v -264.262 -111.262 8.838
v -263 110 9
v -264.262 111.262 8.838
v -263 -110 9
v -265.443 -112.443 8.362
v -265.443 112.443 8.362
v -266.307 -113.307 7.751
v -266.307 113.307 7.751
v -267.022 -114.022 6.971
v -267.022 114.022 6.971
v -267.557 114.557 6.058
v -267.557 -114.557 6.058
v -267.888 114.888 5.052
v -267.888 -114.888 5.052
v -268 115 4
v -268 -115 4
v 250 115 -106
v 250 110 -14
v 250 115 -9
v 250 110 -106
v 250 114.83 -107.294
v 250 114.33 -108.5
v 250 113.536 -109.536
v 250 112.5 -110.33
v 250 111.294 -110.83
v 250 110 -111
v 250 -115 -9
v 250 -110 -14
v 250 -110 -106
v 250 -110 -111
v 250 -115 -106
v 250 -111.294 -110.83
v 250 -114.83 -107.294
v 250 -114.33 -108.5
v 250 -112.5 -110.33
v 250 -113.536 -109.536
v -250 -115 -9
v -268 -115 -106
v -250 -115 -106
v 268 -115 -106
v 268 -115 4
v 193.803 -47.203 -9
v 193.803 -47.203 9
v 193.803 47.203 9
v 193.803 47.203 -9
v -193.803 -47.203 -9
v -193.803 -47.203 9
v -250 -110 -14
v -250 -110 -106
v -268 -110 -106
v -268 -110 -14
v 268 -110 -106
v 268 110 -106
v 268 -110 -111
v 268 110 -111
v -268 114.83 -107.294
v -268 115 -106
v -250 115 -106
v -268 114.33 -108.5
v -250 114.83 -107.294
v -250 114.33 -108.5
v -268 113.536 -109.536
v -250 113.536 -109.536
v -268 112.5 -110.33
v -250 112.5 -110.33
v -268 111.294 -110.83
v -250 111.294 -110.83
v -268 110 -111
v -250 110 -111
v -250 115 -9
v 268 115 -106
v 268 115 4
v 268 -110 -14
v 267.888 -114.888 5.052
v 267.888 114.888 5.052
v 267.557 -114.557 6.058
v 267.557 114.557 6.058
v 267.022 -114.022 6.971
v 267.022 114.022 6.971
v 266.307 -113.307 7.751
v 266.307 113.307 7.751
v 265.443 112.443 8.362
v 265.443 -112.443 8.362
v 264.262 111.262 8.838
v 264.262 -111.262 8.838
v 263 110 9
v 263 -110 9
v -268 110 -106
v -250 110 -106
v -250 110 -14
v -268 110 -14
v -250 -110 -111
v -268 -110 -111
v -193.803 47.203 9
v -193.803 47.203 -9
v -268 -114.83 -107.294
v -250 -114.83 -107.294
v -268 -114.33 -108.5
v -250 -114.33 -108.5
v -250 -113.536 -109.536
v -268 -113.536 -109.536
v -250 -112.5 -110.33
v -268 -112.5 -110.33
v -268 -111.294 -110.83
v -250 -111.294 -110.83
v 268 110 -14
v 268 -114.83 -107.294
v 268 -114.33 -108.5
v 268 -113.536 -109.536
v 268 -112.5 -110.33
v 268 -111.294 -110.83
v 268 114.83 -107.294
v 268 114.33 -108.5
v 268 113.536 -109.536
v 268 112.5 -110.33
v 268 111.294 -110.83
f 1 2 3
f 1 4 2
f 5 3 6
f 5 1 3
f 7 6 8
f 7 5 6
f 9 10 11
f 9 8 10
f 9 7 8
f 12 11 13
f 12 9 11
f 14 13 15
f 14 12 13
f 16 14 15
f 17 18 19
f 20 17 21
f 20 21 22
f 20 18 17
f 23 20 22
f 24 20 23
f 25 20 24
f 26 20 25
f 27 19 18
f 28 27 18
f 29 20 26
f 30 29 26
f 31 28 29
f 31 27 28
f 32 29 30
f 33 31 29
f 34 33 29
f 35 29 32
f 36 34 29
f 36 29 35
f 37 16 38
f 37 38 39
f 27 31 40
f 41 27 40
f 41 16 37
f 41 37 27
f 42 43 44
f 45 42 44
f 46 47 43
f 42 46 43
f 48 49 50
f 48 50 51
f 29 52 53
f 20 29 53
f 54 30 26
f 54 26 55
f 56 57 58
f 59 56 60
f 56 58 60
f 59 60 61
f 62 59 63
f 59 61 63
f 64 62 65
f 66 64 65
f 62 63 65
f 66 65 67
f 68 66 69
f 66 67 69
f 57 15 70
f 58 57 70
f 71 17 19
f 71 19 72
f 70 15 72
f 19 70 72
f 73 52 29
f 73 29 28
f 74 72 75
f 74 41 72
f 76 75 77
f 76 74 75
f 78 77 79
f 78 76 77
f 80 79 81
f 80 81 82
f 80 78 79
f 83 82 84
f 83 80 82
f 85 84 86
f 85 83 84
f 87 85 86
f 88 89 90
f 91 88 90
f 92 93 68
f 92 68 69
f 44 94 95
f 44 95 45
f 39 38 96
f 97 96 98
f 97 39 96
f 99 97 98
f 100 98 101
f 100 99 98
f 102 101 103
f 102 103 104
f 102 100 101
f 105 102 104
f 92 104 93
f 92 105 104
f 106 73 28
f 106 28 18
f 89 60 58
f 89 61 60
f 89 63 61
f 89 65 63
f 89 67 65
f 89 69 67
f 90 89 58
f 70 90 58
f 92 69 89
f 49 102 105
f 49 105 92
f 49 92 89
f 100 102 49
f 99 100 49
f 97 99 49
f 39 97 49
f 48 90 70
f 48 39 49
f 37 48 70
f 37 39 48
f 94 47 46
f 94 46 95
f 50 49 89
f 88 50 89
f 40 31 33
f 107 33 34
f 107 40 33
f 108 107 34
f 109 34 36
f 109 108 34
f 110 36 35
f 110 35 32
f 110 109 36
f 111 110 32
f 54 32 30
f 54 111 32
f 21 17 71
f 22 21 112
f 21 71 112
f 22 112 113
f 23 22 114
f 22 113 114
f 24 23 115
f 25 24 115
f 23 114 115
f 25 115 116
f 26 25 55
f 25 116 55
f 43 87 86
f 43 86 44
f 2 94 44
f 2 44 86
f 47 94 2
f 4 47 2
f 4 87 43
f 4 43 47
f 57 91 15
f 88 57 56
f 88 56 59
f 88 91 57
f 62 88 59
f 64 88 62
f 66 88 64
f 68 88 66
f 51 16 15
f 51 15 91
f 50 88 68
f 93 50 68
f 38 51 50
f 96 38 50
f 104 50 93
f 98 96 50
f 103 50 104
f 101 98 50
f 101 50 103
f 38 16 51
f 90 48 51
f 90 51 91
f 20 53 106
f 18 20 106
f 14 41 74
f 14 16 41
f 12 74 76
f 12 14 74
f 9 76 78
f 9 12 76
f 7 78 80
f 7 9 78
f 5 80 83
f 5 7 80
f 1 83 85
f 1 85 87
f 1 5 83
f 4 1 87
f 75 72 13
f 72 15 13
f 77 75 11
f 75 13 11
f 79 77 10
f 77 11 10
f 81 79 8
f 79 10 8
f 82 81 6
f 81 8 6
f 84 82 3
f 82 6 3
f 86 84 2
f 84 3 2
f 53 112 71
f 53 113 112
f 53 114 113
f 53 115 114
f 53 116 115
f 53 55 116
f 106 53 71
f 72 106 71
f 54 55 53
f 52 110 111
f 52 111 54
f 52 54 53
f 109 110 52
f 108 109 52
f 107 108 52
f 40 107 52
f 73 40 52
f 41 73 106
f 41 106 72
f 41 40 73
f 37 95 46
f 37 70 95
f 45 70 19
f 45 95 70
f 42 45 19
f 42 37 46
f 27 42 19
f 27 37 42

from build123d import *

# Parameters (mm, degrees)
F0_W     = 500
F0_H     = 18
F1_DEPTH = 115
F2_W     = 220
F2_H     = 92
F3_DEPTH = 275
F4_R     = 5
F5_W     = 387.605816
F5_H     = 94.405166
F6_DEPTH = 120.001


with BuildPart() as f1:
    # F0 (on Front) → F1 (new body, symmetric)
    with BuildSketch(Plane.XZ):
        Rectangle(F0_W, F0_H)
        Polygon((-250, -111), (-250, -9), (-250, 9), (-268, 9), (-268, -111), align=None)
        Polygon((250, 9), (250, -9), (250, -111), (268, -111), (268, 9), align=None)
    extrude(amount=F1_DEPTH, both=True)

    # F2 (on Right) → F3 (cut, symmetric)
    with BuildSketch(Plane.YZ):
        with Locations((0, -60)):
            Rectangle(F2_W, F2_H)
    extrude(amount=F3_DEPTH, both=True, mode=Mode.SUBTRACT)

    # F4
    f4_edges = [f1.edges().sort_by_distance(p)[0] for p in [
        (259, 115, -111),
        (-259, 115, -111),
        (-259, -115, -111),
        (259, -115, -111),
        (0, -115, 9),
        (0, 115, 9),
        (-268, 0, 9),
        (268, 0, 9),
    ]]
    fillet(f4_edges, radius=F4_R)

    # F5 (on face) → F6 (cut, through all)
    with BuildSketch(Plane.XY.offset(9)):
        Rectangle(F5_W, F5_H)
    extrude(amount=-F6_DEPTH, mode=Mode.SUBTRACT)


solid = f1.part
